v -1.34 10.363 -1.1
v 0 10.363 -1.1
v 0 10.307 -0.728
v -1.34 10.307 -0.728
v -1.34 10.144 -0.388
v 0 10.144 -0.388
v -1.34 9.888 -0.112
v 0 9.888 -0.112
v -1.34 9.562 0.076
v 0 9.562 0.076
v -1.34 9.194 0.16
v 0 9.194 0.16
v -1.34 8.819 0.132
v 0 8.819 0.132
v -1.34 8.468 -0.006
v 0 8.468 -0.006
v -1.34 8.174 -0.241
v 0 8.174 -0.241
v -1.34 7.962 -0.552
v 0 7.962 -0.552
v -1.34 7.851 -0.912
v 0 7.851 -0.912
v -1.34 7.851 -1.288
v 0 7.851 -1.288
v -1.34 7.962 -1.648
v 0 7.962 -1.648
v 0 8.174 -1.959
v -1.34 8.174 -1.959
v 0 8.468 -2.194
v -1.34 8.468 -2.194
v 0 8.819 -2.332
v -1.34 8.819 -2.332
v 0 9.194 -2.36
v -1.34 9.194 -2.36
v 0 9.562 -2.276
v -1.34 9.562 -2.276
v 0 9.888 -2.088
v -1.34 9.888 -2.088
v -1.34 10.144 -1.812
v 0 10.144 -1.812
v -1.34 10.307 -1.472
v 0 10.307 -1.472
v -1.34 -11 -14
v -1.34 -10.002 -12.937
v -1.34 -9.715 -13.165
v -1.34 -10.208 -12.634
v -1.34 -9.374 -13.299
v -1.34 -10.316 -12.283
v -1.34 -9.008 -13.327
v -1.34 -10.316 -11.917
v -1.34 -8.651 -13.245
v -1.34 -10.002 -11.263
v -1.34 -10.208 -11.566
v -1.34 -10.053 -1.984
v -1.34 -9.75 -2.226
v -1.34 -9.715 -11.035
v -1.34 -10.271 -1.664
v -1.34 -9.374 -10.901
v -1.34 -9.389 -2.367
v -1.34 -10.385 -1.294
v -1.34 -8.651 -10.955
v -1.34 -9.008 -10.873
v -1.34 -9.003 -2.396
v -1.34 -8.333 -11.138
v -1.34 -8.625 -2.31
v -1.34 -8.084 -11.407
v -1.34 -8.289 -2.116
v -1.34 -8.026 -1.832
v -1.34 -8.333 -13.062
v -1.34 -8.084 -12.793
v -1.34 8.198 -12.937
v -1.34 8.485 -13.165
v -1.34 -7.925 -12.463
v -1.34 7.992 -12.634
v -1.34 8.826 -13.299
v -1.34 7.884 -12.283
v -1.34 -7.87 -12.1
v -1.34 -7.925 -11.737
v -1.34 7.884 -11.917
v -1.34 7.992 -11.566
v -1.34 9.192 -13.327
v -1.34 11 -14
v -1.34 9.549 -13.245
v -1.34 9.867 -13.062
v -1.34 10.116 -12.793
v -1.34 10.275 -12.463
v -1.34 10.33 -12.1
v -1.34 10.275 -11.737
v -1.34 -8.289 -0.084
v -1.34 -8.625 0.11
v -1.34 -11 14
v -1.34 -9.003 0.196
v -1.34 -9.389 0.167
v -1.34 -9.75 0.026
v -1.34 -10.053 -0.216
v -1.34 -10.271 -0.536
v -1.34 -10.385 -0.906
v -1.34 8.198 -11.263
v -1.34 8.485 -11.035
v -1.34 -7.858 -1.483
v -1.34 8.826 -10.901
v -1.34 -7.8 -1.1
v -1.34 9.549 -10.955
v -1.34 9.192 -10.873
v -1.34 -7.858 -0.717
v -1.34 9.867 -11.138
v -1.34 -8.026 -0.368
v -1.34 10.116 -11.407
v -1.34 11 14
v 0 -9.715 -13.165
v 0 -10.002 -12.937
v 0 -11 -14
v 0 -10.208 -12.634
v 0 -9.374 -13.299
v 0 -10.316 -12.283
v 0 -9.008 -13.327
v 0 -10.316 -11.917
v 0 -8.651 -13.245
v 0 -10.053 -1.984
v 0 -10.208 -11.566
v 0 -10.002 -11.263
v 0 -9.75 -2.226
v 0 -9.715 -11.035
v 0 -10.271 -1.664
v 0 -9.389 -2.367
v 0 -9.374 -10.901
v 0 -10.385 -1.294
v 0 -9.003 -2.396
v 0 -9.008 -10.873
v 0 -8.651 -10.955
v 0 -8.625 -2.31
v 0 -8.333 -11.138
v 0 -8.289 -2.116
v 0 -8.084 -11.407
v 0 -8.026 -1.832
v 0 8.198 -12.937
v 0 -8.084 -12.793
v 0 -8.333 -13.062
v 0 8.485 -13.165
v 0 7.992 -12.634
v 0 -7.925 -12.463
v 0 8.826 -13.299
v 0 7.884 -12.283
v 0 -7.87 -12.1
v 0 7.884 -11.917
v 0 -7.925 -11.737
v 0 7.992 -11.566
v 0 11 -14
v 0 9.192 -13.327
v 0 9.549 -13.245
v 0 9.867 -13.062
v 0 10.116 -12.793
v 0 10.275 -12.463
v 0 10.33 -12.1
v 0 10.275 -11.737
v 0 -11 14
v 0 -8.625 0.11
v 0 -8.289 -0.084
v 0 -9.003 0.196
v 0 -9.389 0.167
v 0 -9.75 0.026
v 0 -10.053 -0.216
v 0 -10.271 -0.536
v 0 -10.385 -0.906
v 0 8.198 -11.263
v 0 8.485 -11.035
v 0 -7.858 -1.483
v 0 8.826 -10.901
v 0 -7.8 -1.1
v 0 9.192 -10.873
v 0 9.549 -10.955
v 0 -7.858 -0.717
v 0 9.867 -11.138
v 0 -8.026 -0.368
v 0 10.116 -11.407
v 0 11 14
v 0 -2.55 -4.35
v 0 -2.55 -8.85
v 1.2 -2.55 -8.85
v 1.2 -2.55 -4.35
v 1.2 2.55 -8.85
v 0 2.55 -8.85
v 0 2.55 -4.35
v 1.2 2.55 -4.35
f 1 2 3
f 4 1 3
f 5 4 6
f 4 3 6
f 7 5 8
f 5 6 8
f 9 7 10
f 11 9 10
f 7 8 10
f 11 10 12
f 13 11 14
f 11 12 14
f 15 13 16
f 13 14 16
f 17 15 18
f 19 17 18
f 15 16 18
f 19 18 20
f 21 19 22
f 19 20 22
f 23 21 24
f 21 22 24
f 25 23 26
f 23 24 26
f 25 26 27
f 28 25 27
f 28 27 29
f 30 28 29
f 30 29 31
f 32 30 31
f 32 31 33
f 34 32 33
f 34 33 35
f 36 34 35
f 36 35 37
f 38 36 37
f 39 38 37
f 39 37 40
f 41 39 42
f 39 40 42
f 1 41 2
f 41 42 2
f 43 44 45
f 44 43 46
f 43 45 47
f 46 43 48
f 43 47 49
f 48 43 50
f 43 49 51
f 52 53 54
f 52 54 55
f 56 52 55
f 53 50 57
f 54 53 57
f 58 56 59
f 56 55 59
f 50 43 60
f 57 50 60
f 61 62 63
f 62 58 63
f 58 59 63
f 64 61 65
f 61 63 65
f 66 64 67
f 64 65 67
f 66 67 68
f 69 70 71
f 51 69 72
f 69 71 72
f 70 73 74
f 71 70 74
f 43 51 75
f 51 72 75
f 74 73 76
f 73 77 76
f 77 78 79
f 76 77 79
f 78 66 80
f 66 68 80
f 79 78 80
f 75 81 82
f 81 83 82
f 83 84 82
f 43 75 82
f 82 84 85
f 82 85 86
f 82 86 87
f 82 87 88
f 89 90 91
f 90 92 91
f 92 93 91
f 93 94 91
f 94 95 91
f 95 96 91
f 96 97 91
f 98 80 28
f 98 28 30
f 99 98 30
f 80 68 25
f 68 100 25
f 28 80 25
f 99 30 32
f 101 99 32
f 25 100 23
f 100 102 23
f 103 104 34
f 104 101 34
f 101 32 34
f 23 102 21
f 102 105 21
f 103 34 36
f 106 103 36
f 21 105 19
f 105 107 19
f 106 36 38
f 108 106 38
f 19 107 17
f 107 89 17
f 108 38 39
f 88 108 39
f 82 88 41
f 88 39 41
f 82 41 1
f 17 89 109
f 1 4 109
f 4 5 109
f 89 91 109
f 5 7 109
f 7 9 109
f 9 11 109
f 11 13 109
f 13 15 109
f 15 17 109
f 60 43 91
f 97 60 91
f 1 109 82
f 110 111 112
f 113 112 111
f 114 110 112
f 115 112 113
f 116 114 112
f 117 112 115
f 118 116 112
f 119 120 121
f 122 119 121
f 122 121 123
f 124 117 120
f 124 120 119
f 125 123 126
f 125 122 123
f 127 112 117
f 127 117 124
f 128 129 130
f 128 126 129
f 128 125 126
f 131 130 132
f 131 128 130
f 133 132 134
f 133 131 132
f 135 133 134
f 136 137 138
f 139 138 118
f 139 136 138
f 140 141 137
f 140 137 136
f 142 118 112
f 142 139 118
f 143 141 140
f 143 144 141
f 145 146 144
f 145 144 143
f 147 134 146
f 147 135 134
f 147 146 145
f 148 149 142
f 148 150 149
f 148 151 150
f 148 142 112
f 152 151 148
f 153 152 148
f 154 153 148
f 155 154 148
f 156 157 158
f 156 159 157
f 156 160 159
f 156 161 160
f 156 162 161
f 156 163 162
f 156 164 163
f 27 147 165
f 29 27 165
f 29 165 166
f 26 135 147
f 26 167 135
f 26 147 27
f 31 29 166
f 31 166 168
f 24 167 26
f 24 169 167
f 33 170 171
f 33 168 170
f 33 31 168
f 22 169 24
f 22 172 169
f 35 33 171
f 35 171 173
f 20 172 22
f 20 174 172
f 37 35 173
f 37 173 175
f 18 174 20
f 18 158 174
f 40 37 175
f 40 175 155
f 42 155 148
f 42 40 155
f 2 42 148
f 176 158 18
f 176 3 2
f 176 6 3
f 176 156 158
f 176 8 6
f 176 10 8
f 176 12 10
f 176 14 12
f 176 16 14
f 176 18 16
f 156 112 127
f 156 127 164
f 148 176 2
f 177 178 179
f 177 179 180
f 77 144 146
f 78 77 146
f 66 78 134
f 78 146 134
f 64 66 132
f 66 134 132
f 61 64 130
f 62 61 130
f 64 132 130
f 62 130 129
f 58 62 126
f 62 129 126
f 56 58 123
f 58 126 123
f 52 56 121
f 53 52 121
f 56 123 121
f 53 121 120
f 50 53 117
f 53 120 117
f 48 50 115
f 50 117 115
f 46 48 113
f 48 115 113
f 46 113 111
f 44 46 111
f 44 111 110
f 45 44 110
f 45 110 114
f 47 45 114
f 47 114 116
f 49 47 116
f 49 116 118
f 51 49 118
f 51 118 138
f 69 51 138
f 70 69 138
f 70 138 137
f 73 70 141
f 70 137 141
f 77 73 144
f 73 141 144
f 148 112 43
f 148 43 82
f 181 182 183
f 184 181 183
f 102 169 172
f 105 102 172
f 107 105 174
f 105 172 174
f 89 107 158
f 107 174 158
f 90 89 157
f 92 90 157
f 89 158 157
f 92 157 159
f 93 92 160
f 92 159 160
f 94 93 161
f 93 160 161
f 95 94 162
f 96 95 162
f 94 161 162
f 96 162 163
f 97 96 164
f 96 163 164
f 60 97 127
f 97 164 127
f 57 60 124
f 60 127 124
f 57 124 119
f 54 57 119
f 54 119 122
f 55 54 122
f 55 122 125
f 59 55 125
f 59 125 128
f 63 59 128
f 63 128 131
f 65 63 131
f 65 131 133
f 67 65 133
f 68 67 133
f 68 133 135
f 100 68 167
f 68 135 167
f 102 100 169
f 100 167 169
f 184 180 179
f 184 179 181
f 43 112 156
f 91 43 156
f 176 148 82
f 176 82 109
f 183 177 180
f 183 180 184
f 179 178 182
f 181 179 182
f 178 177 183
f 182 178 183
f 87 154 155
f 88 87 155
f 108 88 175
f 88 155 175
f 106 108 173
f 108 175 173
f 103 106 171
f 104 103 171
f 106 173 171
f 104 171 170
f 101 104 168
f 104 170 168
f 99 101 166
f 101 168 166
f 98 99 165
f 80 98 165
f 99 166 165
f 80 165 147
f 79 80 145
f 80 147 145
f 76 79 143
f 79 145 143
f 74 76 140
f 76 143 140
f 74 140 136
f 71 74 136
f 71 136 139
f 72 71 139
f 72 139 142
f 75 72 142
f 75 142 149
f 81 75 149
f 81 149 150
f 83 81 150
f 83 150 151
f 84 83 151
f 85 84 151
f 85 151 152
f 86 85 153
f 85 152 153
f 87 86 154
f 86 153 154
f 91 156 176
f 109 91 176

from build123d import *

# Parameters (mm, degrees)
F0_W     = 22
F0_H     = 28
F0_R     = 1.230066
F0_R_2   = 1.3
F0_W_2   = 5.1
F0_H_2   = 4.5
F0_R_3   = 1.263321
F1_DEPTH = 1.34
F2_DEPTH = 1.2


with BuildPart() as f1:
    # F0 (on Right) → F1 (new body)
    with BuildSketch(Plane.YZ):
        Rectangle(F0_W, F0_H)
        with Locations((-9.1, -12.1)):
            Circle(F0_R, mode=Mode.SUBTRACT)
        with Locations((-9.1, -1.1)):
            Circle(F0_R_2, mode=Mode.SUBTRACT)
        with Locations((9.1, -12.1)):
            Circle(F0_R, mode=Mode.SUBTRACT)
        with Locations((0, -6.6)):
            Rectangle(F0_W_2, F0_H_2, mode=Mode.SUBTRACT)
        with Locations((9.1, -1.1)):
            Circle(F0_R_3, mode=Mode.SUBTRACT)
        with Locations((0, -6.6)):
            Rectangle(F0_W_2, F0_H_2)
    extrude(amount=-F1_DEPTH)


with BuildPart() as f2:
    # F0 (on Right) → F2 (new body)
    with BuildSketch(Plane.YZ):
        with Locations((0, -6.6)):
            Rectangle(F0_W_2, F0_H_2)
    extrude(amount=F2_DEPTH)


solid = Compound([f1.part, f2.part])
